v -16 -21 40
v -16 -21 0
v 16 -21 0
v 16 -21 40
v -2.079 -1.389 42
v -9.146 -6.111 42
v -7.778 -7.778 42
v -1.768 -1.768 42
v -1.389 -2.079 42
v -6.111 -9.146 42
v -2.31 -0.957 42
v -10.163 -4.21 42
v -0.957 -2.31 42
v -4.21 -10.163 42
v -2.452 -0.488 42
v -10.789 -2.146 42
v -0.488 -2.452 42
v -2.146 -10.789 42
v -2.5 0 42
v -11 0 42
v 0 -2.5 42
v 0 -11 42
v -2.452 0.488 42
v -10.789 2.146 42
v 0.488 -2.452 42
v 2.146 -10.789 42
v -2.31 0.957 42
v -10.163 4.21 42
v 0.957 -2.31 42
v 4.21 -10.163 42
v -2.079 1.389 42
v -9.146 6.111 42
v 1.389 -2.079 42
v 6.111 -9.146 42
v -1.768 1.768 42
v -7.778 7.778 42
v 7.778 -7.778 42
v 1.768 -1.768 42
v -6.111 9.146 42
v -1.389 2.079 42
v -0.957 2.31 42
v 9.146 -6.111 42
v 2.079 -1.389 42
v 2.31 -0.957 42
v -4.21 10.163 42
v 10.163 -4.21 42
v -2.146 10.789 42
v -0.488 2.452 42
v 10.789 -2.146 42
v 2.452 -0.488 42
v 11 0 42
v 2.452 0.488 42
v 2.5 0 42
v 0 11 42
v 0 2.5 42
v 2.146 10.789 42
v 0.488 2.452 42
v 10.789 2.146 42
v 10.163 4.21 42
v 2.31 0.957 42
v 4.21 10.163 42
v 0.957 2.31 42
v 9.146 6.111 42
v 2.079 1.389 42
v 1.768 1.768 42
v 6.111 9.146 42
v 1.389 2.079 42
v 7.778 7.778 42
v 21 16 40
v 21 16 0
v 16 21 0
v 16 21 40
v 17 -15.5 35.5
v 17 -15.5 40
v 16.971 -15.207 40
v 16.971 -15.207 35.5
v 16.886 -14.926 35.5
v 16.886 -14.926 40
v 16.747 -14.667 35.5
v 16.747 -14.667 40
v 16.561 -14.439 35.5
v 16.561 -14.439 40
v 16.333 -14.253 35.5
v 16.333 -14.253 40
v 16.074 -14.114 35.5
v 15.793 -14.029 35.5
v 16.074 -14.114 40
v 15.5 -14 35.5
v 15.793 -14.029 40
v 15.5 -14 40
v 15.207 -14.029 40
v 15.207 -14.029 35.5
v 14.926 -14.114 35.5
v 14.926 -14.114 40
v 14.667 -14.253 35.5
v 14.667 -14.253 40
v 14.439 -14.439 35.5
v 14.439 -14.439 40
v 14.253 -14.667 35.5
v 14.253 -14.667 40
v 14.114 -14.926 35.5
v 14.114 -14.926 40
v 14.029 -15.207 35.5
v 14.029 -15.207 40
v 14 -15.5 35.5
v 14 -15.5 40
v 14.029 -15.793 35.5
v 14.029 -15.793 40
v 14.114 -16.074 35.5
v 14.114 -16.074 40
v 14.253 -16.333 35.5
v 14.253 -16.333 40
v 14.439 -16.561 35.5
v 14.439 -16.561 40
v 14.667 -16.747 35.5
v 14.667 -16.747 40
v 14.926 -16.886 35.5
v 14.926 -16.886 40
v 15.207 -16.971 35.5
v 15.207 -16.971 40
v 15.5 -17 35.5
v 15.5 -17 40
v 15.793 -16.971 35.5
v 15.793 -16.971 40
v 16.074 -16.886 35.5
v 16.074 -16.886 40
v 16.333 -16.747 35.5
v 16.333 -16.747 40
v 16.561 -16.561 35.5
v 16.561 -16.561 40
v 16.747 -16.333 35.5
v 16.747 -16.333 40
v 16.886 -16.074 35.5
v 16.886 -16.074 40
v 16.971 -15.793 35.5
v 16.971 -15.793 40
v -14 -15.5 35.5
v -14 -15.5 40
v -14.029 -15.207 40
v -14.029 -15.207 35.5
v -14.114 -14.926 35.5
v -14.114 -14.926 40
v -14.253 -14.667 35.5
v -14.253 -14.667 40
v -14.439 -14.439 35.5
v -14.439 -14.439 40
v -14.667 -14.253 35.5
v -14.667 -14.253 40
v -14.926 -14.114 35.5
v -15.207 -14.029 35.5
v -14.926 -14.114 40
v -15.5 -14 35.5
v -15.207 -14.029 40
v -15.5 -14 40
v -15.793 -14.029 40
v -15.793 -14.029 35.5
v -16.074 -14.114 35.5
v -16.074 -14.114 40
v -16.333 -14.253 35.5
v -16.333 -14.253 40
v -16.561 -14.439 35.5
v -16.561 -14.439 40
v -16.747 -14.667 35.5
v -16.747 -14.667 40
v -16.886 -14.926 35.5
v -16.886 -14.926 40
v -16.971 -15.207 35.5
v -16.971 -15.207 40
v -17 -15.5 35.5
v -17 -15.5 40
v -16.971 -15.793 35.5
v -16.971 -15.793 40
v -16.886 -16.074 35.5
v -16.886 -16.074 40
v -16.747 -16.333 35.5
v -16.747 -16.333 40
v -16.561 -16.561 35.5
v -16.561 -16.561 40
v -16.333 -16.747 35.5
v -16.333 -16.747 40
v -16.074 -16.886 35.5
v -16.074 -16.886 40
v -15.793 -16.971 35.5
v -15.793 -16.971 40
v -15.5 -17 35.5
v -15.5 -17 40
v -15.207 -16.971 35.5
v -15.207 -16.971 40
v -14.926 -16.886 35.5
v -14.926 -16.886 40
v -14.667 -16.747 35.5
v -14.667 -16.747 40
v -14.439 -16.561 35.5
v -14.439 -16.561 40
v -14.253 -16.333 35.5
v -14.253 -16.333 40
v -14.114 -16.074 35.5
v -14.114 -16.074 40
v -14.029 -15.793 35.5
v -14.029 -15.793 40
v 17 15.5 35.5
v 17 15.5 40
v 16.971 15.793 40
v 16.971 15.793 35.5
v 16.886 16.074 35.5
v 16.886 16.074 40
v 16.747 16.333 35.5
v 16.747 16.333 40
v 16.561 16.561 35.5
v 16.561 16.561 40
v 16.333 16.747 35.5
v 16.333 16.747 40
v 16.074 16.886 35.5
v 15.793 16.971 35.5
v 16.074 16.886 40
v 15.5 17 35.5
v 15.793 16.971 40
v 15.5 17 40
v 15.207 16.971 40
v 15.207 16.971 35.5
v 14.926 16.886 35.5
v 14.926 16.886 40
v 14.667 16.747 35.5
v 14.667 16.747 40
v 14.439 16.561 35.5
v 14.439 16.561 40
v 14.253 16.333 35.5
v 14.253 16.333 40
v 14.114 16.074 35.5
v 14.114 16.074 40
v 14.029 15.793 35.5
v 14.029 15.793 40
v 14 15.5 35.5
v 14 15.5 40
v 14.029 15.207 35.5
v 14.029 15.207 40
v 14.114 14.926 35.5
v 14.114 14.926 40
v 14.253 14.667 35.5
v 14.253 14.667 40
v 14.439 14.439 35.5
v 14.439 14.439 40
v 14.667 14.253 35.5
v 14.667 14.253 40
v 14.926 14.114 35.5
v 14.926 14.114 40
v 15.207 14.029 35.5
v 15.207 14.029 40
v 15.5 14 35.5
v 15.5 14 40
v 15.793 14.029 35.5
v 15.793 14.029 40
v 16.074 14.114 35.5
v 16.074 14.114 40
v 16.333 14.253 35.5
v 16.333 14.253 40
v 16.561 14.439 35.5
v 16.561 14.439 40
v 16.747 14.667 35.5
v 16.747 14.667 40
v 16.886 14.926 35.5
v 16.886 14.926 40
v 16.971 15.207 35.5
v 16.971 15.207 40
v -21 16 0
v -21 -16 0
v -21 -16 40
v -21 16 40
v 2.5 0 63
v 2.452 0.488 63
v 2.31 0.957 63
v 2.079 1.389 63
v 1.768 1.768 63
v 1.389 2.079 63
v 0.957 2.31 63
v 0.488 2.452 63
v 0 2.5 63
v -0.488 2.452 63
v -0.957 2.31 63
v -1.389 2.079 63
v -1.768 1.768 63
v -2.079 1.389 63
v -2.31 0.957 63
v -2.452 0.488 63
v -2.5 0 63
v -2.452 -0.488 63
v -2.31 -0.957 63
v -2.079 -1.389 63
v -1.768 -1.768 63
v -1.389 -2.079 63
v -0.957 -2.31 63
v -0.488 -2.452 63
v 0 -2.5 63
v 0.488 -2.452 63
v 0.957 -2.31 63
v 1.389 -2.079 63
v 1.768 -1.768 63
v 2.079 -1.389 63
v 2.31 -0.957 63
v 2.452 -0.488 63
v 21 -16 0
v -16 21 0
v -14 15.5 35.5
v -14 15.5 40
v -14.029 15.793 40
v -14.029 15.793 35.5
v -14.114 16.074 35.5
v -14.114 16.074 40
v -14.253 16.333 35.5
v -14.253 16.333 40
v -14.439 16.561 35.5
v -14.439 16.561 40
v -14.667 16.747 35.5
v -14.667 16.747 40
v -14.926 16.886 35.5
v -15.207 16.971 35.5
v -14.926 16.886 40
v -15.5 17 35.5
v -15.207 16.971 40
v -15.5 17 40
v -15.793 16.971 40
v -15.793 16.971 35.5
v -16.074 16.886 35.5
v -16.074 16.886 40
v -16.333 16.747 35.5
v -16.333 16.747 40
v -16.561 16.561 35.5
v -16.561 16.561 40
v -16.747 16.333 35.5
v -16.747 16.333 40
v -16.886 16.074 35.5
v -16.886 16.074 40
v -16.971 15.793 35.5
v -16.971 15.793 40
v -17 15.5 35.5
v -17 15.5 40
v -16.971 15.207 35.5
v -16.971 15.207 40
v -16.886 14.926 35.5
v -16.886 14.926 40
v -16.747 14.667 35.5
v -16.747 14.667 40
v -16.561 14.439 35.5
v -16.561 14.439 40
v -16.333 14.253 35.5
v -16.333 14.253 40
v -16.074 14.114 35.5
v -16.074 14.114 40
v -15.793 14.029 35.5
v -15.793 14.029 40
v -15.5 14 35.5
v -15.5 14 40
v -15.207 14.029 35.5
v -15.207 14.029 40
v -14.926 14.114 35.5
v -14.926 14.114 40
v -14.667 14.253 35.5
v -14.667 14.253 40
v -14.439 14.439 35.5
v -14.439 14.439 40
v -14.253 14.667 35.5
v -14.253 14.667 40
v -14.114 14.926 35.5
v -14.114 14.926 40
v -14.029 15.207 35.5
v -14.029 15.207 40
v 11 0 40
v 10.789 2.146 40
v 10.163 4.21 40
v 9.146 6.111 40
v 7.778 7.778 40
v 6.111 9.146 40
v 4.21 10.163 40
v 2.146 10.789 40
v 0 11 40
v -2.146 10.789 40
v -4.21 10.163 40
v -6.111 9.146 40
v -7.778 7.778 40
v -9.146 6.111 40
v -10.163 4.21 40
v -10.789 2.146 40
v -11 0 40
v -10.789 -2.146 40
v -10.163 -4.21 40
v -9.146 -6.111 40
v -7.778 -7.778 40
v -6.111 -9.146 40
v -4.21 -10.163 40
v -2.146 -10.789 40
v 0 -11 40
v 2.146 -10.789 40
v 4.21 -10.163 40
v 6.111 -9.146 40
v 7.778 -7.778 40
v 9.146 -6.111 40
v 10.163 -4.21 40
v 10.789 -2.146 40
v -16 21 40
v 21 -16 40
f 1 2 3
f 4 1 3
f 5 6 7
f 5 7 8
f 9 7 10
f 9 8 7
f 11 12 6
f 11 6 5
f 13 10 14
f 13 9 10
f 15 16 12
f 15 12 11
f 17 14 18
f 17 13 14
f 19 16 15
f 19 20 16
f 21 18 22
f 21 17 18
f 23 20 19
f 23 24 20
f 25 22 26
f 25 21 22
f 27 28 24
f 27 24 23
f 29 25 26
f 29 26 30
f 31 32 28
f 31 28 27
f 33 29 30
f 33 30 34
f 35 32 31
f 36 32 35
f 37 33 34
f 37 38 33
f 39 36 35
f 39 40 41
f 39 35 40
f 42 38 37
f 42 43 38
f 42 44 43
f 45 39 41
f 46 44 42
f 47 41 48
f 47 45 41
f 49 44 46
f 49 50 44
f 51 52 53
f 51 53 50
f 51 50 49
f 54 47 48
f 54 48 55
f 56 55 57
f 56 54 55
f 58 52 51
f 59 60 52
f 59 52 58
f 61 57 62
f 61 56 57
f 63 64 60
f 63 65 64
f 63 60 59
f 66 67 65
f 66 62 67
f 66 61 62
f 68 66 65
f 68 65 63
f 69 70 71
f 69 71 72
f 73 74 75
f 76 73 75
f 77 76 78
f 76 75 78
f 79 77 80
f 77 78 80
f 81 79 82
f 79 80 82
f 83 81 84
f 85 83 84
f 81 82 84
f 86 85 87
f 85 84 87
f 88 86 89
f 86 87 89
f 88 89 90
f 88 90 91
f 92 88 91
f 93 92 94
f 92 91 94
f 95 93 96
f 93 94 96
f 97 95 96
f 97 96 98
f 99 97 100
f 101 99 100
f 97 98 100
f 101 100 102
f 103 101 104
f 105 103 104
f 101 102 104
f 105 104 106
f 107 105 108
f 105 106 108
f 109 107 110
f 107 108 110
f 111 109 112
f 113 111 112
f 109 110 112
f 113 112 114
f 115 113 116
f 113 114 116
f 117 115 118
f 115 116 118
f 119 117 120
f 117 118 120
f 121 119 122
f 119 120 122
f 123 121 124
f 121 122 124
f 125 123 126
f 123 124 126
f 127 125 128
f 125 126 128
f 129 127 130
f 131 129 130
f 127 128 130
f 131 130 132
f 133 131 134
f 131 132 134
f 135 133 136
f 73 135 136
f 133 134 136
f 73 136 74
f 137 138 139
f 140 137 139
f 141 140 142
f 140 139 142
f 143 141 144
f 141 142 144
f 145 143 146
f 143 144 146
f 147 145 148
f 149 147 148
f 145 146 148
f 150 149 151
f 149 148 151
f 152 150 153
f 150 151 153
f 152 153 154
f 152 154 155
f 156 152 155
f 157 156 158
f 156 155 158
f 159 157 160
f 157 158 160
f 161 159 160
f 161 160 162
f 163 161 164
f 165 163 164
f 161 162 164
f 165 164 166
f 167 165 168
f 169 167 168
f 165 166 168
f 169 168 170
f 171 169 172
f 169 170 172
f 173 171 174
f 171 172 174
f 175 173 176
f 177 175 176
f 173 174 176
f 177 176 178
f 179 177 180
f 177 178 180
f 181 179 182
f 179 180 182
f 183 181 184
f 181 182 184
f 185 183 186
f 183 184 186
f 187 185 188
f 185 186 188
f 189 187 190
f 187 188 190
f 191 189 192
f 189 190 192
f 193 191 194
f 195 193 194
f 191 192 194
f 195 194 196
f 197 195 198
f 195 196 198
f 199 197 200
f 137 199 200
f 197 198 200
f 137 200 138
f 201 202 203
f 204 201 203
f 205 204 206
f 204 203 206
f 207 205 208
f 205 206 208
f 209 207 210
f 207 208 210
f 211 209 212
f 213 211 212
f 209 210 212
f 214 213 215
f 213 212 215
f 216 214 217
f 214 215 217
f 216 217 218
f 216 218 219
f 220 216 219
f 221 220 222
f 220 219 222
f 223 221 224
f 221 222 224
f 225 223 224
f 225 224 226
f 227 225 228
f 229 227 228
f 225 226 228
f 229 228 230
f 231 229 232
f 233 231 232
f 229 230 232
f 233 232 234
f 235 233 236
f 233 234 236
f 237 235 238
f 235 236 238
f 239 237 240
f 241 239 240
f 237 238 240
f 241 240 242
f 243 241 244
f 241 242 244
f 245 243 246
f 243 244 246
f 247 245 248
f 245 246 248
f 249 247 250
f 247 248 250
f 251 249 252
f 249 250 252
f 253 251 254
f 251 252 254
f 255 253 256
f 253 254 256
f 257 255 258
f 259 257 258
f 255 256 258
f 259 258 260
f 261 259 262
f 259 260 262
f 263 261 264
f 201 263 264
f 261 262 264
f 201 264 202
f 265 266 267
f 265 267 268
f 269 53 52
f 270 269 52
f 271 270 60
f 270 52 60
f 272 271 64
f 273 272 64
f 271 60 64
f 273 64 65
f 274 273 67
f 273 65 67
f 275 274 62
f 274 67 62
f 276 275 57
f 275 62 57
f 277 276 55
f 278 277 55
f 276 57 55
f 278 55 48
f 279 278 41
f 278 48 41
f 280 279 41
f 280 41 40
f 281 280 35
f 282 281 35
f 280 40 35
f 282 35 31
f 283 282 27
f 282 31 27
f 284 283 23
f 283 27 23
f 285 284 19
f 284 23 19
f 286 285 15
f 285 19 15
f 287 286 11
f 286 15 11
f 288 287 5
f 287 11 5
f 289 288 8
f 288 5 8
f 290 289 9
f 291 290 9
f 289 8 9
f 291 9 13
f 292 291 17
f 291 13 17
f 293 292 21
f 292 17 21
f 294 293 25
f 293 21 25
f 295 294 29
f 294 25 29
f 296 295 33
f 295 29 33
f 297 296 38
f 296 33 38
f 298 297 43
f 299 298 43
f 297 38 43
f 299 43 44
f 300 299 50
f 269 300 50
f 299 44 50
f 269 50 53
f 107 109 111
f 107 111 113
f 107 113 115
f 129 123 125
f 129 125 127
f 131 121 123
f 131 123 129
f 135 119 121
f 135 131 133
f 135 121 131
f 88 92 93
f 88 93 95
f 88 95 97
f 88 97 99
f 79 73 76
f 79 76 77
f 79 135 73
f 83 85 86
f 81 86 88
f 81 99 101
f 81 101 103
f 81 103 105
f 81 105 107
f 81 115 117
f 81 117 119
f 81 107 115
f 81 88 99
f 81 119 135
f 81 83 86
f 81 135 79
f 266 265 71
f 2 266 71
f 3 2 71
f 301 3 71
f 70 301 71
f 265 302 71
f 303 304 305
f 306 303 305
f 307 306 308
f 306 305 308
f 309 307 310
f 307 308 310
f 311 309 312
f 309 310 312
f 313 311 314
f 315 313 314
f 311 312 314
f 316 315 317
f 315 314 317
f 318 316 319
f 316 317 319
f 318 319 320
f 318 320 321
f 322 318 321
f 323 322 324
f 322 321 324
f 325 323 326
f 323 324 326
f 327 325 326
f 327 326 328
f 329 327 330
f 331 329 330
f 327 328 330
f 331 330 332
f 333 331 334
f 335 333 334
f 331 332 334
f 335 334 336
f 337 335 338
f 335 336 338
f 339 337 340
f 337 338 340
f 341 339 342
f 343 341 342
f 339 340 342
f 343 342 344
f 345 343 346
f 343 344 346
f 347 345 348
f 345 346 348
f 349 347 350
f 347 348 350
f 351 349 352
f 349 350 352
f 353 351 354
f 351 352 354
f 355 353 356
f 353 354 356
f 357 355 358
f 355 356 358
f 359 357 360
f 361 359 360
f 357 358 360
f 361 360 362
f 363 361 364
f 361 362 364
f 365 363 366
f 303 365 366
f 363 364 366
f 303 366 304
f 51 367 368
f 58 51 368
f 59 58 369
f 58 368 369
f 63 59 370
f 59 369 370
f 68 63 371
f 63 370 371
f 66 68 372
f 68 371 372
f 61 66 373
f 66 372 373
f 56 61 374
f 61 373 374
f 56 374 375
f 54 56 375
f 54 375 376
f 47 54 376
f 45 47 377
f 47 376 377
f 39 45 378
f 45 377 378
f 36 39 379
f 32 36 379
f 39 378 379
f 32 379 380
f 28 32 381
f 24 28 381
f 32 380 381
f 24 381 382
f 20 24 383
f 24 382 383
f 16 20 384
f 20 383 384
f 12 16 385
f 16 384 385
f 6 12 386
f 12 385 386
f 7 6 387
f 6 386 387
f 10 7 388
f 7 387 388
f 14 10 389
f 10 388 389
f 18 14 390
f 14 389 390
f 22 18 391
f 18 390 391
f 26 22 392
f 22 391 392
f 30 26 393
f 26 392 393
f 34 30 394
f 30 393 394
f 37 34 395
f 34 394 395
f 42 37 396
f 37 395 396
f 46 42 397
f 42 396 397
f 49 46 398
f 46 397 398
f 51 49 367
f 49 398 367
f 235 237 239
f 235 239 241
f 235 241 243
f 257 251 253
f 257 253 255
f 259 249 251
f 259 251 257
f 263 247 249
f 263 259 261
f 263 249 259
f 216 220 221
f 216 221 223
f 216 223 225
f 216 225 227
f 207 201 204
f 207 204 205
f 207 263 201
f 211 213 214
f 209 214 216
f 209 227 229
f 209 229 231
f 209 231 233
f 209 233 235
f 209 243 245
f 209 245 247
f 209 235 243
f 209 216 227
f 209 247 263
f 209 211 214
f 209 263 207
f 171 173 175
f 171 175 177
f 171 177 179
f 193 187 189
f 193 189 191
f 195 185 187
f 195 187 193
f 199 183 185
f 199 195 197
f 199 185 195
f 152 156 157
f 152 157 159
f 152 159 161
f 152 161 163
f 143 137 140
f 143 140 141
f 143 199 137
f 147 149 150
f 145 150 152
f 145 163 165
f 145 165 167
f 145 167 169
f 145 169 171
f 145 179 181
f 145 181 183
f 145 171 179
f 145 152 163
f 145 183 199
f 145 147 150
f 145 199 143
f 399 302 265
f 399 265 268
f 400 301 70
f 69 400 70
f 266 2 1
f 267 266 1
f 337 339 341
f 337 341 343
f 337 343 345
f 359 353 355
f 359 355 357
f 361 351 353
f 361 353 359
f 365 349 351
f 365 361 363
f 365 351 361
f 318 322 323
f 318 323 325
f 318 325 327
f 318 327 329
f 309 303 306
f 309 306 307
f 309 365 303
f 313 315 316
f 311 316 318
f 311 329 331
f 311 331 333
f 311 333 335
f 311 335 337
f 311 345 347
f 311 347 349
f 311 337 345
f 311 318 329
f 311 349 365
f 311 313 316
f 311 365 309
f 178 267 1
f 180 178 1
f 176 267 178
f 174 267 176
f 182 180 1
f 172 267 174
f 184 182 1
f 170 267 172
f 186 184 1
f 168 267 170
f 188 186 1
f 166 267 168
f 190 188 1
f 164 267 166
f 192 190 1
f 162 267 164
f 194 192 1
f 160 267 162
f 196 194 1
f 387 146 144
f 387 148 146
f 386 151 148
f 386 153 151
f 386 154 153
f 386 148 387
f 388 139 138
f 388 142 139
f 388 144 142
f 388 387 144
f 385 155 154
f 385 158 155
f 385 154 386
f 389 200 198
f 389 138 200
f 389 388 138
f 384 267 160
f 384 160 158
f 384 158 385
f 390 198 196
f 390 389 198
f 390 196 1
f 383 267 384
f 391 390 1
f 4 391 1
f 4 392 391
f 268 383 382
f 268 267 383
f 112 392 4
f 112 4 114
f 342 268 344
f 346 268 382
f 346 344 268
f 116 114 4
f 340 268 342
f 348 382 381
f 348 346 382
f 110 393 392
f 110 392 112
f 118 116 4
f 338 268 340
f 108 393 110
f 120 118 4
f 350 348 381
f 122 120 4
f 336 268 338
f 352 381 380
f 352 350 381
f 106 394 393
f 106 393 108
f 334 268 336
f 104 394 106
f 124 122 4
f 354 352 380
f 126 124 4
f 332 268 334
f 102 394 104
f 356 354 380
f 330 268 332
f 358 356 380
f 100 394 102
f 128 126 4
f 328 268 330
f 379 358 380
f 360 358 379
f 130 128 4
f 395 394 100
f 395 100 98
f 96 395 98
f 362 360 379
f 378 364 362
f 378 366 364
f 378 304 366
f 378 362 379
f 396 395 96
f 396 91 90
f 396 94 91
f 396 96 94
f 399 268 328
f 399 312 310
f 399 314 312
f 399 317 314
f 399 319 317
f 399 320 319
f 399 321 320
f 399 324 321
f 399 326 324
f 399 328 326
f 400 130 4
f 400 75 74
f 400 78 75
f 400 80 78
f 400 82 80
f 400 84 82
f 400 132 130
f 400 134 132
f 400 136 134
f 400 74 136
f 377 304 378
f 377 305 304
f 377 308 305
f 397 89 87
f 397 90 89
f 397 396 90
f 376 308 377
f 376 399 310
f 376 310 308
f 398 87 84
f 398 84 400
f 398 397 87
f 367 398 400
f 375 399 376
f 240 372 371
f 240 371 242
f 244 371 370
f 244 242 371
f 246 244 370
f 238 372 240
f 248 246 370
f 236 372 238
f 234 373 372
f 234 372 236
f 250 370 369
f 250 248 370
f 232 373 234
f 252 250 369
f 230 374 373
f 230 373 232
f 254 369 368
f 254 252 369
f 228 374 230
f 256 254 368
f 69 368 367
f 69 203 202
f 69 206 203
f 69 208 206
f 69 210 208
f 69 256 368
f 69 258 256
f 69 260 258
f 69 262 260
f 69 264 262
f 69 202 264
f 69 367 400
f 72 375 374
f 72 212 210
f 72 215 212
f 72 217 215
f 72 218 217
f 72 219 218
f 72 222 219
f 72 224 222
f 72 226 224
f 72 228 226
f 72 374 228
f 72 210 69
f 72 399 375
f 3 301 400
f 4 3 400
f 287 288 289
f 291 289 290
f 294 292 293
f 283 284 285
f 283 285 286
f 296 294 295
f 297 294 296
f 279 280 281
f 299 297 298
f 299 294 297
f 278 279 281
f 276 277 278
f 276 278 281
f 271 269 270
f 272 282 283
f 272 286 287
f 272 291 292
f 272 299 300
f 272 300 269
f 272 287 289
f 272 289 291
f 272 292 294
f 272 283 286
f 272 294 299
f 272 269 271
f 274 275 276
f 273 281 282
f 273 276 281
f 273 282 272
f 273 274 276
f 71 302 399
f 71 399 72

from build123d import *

# Parameters (mm, degrees)
F0_W     = 42
F0_H     = 42
F1_DEPTH = 40
F2_R     = 11
F3_DEPTH = 2
F4_R     = 2.5
F5_DEPTH = 21
F6_R     = 1.5
F7_DEPTH = 4.5
F8_SIZE  = 5


with BuildPart() as f1:
    # F0 (on Top) → F1 (new body)
    with BuildSketch(Plane.XY):
        Rectangle(F0_W, F0_H)
    extrude(amount=F1_DEPTH)

    # F2 (on face) → F3 (join)
    with BuildSketch(Plane.XY.offset(40)):
        Circle(F2_R)
    extrude(amount=F3_DEPTH)

    # F4 (on face) → F5 (join)
    with BuildSketch(Plane.XY.offset(42)):
        Circle(F4_R)
    extrude(amount=F5_DEPTH)

    # F6 (on face) → F7 (cut)
    with BuildSketch(Plane.XY.offset(40)):
        with Locations((-15.5, 15.5)):
            Circle(F6_R)
        with Locations((-15.5, -15.5)):
            Circle(F6_R)
        with Locations((15.5, 15.5)):
            Circle(F6_R)
        with Locations((15.5, -15.5)):
            Circle(F6_R)
    extrude(amount=-F7_DEPTH, mode=Mode.SUBTRACT)

    # F8
    f8_edges = [f1.edges().sort_by_distance(p)[0] for p in [
        (21, 21, 20),
        (21, -21, 20),
        (-21, -21, 20),
        (-21, 21, 20),
    ]]
    chamfer(f8_edges, length=F8_SIZE)


solid = f1.part
